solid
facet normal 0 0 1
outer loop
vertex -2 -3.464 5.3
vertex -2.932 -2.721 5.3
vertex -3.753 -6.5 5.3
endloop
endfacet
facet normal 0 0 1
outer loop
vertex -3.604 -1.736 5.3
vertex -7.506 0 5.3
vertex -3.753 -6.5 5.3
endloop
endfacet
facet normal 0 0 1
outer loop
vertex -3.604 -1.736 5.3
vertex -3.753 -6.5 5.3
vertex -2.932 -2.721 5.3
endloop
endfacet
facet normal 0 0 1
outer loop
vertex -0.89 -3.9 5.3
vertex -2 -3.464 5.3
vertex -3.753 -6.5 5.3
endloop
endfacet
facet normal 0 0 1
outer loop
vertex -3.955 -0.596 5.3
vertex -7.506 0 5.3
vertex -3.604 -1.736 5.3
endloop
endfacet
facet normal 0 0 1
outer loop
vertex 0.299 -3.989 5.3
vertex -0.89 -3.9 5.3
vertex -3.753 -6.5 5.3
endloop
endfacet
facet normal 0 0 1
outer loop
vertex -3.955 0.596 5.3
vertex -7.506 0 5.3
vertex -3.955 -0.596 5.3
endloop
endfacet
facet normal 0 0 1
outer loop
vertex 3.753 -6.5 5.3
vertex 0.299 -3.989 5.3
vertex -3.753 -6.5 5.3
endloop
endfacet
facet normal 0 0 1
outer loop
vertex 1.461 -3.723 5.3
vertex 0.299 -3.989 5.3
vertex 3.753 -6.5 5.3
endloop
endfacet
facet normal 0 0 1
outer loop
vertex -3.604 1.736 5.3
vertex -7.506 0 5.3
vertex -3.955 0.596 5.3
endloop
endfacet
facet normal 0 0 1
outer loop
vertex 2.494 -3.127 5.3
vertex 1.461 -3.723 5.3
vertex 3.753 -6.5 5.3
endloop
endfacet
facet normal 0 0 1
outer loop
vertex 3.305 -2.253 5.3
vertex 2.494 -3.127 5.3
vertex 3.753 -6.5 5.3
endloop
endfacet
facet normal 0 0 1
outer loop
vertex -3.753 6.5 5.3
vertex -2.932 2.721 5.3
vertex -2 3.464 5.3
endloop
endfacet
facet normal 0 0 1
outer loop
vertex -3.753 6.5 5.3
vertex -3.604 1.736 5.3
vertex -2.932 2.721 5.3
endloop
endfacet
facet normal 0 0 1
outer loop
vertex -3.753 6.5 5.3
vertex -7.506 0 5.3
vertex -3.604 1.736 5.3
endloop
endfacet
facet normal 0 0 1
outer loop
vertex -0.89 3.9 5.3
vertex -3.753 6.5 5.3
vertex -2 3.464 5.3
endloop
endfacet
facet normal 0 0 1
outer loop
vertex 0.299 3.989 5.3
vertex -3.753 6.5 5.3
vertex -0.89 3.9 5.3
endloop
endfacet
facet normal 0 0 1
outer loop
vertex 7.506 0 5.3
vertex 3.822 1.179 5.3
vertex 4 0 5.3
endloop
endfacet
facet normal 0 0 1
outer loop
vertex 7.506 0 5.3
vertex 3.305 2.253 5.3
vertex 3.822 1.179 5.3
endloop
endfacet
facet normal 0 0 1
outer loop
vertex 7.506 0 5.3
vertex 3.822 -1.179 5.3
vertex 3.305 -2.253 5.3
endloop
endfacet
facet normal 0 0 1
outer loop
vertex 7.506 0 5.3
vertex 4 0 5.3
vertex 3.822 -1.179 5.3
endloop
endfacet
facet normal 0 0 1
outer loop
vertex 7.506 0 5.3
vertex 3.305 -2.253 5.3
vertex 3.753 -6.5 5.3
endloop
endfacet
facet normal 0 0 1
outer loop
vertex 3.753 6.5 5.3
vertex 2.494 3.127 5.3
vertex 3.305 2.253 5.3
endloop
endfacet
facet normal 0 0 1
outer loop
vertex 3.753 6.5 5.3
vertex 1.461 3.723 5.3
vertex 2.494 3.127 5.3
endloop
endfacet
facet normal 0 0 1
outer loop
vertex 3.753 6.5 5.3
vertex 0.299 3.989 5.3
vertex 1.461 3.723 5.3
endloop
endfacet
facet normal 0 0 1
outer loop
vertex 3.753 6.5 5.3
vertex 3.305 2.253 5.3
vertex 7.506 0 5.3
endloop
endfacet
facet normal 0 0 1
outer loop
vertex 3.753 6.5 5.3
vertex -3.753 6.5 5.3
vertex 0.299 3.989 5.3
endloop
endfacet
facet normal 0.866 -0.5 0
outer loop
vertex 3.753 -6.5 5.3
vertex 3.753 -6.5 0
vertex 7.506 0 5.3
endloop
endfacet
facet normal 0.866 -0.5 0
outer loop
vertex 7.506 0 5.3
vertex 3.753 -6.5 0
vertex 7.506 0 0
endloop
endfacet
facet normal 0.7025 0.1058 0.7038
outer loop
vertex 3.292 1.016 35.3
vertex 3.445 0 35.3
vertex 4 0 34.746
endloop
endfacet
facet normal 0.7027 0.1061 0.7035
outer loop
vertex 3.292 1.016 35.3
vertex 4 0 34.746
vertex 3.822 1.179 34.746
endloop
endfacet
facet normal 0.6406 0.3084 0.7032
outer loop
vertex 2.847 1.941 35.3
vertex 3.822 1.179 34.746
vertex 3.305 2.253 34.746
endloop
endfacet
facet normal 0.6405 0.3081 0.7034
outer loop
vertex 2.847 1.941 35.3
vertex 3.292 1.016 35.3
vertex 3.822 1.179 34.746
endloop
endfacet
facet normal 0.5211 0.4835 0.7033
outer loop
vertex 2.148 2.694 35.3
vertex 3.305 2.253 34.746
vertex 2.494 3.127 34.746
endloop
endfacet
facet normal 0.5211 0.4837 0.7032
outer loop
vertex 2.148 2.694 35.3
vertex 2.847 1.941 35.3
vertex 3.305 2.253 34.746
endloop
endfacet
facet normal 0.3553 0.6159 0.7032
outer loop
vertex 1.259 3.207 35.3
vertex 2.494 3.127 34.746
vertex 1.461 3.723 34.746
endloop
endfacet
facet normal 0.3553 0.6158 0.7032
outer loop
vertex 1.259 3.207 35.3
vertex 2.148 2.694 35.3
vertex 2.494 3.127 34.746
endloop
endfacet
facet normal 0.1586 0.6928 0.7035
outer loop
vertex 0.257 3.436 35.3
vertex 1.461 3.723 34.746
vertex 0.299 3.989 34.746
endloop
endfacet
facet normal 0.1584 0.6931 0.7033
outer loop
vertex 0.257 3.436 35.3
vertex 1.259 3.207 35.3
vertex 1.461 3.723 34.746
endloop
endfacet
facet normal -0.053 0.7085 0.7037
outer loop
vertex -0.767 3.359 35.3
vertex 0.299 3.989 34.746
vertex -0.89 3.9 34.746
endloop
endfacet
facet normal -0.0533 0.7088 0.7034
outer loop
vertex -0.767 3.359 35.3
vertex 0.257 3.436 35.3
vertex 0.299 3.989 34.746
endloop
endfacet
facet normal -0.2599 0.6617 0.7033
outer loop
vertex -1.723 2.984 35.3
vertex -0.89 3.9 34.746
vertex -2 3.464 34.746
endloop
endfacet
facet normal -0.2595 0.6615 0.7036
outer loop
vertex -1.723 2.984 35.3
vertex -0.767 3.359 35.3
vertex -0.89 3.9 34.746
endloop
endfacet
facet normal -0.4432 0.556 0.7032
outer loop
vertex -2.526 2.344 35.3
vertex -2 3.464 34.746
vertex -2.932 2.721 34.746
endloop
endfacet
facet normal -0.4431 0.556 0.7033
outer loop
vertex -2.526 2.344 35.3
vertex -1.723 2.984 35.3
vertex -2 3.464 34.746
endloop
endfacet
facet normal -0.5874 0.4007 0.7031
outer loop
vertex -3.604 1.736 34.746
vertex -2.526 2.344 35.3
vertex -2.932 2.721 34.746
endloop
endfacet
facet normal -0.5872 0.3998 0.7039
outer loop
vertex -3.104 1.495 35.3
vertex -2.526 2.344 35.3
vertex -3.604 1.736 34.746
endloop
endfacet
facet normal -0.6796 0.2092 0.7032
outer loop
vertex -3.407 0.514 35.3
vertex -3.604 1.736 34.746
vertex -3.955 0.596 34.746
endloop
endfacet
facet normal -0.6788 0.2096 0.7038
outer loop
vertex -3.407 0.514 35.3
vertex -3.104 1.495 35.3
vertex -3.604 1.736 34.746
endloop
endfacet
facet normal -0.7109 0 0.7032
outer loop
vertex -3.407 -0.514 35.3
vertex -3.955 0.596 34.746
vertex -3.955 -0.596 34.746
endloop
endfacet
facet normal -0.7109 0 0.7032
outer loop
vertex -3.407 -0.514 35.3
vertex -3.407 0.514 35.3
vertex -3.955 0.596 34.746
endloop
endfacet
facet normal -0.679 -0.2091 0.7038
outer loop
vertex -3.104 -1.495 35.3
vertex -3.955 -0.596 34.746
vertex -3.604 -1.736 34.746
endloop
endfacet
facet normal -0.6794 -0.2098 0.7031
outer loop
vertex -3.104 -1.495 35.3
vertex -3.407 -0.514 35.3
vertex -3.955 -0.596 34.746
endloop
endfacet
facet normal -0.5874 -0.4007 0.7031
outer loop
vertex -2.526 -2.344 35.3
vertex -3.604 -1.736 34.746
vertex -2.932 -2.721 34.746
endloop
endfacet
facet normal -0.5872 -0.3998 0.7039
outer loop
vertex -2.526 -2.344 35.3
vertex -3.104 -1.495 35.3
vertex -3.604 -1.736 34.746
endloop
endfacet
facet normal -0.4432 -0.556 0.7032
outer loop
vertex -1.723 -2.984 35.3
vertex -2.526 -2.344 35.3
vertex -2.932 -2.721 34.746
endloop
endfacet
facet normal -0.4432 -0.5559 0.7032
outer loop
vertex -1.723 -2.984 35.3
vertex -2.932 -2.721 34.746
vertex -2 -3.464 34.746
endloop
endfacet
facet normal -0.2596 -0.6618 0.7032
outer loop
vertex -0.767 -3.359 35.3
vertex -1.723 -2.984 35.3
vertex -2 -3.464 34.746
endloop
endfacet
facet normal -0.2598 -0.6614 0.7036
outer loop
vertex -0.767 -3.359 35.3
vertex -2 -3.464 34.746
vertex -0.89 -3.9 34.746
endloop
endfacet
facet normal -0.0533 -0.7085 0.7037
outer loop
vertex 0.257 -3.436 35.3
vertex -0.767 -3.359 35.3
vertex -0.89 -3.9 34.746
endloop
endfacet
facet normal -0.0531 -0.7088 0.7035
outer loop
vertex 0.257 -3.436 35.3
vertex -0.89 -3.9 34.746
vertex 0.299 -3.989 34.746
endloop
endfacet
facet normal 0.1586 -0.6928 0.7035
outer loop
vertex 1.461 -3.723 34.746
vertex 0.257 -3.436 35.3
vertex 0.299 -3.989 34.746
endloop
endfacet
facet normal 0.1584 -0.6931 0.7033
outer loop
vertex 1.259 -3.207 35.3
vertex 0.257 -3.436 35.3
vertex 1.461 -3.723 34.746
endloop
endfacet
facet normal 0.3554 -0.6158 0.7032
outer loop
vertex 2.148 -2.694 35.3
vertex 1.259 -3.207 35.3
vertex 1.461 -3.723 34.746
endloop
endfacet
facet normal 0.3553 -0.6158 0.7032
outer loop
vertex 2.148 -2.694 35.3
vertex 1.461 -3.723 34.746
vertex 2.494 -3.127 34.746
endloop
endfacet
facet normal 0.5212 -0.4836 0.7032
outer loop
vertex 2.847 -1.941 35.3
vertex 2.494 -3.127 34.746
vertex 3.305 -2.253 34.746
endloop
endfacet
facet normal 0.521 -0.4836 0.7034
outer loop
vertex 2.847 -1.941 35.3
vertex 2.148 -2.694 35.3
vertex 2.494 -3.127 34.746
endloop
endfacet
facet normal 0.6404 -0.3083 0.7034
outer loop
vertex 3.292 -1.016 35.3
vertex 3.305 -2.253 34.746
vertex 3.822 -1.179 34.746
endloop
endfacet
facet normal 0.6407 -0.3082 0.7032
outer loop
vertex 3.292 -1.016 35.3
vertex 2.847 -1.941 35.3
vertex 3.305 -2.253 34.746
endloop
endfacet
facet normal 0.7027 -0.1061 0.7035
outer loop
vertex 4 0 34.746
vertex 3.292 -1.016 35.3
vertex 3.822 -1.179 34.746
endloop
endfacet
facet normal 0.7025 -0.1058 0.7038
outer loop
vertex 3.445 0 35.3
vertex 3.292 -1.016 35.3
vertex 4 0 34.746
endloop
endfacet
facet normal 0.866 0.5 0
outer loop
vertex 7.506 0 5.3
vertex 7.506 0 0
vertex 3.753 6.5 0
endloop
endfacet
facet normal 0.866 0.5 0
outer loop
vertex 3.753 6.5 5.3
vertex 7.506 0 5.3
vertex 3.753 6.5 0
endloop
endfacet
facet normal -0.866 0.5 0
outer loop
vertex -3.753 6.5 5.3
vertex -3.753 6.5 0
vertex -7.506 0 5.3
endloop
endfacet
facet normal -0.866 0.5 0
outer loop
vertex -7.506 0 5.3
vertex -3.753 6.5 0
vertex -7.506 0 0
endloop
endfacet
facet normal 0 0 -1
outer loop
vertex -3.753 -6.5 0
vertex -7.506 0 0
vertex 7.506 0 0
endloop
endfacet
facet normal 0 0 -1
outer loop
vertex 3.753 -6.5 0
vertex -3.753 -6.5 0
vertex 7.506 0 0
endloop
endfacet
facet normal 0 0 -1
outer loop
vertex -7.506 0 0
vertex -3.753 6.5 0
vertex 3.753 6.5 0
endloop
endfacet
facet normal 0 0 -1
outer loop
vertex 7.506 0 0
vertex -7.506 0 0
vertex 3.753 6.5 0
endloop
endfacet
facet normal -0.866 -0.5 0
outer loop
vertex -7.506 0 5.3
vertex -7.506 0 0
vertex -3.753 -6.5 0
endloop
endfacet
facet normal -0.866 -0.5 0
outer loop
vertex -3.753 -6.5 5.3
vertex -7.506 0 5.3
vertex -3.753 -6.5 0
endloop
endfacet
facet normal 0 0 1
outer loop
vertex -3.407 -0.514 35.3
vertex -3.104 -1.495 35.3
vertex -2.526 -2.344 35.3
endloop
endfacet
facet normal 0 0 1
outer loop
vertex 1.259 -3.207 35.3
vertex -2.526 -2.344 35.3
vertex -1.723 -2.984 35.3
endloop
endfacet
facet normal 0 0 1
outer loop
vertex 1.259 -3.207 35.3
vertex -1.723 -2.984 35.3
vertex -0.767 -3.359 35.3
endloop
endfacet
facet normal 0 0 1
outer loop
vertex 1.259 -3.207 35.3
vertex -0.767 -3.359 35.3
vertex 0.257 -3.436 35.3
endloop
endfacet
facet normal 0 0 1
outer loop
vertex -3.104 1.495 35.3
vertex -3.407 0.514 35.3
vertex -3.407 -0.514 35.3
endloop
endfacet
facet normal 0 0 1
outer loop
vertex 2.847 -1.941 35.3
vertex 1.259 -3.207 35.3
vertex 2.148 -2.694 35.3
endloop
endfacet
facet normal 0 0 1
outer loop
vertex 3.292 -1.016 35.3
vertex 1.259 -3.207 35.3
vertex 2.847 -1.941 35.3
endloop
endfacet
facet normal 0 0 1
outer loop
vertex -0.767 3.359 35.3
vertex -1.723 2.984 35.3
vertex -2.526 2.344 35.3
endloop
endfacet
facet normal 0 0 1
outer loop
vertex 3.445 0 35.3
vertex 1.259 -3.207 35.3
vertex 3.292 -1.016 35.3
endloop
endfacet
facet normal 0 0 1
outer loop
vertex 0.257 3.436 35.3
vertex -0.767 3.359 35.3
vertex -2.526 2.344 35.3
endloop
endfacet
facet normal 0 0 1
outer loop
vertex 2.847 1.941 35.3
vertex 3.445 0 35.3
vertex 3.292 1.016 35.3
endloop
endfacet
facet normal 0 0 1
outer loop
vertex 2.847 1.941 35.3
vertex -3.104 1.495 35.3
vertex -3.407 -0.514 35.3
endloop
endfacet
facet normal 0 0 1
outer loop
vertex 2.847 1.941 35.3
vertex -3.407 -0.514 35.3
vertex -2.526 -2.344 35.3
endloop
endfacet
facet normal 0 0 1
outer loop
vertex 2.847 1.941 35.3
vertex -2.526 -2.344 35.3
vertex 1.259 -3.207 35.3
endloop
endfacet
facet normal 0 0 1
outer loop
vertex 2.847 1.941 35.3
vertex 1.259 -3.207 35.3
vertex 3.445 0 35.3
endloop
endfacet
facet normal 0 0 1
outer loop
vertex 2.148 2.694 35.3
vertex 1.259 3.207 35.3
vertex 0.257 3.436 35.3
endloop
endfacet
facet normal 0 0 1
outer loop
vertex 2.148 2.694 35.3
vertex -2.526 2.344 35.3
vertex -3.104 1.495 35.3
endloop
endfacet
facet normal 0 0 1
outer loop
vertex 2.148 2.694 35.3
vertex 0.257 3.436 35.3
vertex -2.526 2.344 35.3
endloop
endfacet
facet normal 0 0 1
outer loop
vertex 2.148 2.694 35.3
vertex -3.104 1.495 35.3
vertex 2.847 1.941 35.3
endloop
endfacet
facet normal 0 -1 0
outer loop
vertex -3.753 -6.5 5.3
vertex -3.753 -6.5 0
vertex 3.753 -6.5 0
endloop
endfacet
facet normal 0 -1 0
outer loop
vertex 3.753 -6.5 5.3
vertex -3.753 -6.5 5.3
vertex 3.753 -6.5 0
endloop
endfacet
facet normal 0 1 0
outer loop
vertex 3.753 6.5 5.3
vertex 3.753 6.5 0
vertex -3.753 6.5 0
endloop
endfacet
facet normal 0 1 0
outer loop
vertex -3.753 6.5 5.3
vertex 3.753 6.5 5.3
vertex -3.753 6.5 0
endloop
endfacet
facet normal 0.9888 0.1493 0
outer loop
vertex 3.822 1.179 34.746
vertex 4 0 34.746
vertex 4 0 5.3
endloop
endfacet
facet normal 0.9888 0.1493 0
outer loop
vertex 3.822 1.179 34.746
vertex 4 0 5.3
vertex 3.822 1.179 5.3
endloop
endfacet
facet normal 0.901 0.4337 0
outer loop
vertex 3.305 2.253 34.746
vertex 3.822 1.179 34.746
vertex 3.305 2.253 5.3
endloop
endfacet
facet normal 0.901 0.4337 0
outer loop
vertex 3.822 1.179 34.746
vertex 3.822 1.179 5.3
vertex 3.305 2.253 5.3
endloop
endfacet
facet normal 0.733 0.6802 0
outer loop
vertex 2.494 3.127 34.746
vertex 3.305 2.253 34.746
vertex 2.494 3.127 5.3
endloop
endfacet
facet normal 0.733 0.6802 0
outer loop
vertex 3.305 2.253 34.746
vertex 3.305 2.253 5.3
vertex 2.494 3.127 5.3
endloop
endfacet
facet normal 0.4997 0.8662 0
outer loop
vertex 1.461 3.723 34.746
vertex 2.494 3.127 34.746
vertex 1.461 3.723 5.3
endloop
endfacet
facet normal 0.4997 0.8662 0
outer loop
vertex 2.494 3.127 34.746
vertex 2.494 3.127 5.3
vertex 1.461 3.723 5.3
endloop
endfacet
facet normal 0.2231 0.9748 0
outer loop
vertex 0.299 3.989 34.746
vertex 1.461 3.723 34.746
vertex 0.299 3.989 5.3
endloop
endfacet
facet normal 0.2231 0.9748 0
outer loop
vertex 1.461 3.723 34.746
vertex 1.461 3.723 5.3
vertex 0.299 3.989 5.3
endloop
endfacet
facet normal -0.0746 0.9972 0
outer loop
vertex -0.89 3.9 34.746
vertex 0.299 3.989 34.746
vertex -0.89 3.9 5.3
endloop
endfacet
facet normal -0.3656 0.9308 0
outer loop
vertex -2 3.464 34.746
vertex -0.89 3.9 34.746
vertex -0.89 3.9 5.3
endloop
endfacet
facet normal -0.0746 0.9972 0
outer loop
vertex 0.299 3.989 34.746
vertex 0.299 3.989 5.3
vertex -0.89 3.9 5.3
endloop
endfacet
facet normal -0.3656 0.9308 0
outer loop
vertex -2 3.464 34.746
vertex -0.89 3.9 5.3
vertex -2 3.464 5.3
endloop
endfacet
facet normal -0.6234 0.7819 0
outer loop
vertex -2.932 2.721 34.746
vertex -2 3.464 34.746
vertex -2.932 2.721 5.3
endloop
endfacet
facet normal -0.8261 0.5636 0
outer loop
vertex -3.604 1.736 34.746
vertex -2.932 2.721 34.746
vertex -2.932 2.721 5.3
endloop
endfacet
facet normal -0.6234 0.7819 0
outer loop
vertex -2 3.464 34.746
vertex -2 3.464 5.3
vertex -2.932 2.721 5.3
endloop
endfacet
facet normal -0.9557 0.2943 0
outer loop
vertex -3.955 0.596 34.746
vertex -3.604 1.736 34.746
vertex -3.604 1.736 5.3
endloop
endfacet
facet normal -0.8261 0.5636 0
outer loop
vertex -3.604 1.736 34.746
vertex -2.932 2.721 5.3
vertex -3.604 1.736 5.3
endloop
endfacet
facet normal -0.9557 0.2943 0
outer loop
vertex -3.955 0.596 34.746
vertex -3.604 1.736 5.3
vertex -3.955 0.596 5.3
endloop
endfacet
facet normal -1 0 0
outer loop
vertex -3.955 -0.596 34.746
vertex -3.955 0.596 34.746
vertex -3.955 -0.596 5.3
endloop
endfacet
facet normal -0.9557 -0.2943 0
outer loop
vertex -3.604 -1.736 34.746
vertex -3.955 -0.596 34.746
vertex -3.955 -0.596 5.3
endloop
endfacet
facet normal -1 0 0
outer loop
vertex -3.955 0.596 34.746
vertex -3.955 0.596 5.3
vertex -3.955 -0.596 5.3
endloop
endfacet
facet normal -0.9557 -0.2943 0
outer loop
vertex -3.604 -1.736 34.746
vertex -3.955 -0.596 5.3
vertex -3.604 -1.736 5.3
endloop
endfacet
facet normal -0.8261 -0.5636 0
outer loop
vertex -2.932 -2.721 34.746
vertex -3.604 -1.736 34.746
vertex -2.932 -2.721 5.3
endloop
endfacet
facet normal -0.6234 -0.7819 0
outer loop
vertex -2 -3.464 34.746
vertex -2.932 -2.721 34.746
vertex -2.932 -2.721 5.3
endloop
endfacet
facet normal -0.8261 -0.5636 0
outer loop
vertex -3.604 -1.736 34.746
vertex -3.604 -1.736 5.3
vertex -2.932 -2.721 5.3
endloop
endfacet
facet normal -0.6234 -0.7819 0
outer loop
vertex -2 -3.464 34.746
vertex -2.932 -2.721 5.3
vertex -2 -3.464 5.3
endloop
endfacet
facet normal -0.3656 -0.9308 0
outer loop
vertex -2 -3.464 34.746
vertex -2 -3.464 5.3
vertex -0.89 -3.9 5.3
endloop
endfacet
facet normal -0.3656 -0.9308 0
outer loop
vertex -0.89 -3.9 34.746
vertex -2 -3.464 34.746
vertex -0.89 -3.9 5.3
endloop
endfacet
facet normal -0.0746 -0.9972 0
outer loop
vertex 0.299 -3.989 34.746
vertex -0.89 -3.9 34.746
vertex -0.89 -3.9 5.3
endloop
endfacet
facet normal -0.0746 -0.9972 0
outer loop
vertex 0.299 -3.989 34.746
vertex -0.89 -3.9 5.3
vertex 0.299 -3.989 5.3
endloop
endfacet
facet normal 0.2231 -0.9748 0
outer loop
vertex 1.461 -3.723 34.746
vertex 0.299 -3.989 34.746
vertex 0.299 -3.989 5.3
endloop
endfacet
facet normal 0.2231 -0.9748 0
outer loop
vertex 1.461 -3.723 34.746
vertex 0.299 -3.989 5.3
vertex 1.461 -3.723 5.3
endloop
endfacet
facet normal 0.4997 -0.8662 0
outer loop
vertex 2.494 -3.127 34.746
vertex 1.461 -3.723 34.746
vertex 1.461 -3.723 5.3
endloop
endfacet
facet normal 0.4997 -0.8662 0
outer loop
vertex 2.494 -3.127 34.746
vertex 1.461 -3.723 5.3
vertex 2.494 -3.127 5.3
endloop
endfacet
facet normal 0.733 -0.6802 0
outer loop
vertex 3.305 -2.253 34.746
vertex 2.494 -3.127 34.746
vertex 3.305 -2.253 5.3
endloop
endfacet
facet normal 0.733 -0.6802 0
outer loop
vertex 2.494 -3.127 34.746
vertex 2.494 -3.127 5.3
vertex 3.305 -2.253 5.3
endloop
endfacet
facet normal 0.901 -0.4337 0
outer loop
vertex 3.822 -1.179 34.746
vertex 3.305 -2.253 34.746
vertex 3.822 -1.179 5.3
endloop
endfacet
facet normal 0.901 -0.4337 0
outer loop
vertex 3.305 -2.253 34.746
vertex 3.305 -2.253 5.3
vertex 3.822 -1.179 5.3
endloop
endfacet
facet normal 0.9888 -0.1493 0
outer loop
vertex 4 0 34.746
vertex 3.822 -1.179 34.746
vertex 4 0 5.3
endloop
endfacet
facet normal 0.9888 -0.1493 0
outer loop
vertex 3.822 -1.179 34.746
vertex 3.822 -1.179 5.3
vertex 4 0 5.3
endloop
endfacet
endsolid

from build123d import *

# Parameters (mm, degrees)
EXTRUDE_1_DEPTH = 5.3
SKETCH_2_R      = 4
EXTRUDE_2_DEPTH = 30
CHAMFER_1_SIZE  = 0.5545


with BuildPart() as part:
    # Эскиз1 → Бобышка-Вытянуть1 (new body)
    with BuildSketch(Plane.XY):
        Polygon((3.75277675, 6.5), (-3.75277675, 6.5), (-7.505553499, 0), (-3.75277675, -6.5), (3.75277675, -6.5), (7.505553499, 0), align=None)
    extrude(amount=EXTRUDE_1_DEPTH)

    # Эскиз2 → Бобышка-Вытянуть2 (add)
    with BuildSketch(Plane.XY.offset(5.3)):
        Circle(SKETCH_2_R)
    extrude(amount=EXTRUDE_2_DEPTH)

    # Фаска1
    chamfer_1_edges = [part.edges().sort_by_distance(p)[0] for p in [
        (-4, 0, 35.3),
    ]]
    chamfer(chamfer_1_edges, length=CHAMFER_1_SIZE)


solid = part.part
